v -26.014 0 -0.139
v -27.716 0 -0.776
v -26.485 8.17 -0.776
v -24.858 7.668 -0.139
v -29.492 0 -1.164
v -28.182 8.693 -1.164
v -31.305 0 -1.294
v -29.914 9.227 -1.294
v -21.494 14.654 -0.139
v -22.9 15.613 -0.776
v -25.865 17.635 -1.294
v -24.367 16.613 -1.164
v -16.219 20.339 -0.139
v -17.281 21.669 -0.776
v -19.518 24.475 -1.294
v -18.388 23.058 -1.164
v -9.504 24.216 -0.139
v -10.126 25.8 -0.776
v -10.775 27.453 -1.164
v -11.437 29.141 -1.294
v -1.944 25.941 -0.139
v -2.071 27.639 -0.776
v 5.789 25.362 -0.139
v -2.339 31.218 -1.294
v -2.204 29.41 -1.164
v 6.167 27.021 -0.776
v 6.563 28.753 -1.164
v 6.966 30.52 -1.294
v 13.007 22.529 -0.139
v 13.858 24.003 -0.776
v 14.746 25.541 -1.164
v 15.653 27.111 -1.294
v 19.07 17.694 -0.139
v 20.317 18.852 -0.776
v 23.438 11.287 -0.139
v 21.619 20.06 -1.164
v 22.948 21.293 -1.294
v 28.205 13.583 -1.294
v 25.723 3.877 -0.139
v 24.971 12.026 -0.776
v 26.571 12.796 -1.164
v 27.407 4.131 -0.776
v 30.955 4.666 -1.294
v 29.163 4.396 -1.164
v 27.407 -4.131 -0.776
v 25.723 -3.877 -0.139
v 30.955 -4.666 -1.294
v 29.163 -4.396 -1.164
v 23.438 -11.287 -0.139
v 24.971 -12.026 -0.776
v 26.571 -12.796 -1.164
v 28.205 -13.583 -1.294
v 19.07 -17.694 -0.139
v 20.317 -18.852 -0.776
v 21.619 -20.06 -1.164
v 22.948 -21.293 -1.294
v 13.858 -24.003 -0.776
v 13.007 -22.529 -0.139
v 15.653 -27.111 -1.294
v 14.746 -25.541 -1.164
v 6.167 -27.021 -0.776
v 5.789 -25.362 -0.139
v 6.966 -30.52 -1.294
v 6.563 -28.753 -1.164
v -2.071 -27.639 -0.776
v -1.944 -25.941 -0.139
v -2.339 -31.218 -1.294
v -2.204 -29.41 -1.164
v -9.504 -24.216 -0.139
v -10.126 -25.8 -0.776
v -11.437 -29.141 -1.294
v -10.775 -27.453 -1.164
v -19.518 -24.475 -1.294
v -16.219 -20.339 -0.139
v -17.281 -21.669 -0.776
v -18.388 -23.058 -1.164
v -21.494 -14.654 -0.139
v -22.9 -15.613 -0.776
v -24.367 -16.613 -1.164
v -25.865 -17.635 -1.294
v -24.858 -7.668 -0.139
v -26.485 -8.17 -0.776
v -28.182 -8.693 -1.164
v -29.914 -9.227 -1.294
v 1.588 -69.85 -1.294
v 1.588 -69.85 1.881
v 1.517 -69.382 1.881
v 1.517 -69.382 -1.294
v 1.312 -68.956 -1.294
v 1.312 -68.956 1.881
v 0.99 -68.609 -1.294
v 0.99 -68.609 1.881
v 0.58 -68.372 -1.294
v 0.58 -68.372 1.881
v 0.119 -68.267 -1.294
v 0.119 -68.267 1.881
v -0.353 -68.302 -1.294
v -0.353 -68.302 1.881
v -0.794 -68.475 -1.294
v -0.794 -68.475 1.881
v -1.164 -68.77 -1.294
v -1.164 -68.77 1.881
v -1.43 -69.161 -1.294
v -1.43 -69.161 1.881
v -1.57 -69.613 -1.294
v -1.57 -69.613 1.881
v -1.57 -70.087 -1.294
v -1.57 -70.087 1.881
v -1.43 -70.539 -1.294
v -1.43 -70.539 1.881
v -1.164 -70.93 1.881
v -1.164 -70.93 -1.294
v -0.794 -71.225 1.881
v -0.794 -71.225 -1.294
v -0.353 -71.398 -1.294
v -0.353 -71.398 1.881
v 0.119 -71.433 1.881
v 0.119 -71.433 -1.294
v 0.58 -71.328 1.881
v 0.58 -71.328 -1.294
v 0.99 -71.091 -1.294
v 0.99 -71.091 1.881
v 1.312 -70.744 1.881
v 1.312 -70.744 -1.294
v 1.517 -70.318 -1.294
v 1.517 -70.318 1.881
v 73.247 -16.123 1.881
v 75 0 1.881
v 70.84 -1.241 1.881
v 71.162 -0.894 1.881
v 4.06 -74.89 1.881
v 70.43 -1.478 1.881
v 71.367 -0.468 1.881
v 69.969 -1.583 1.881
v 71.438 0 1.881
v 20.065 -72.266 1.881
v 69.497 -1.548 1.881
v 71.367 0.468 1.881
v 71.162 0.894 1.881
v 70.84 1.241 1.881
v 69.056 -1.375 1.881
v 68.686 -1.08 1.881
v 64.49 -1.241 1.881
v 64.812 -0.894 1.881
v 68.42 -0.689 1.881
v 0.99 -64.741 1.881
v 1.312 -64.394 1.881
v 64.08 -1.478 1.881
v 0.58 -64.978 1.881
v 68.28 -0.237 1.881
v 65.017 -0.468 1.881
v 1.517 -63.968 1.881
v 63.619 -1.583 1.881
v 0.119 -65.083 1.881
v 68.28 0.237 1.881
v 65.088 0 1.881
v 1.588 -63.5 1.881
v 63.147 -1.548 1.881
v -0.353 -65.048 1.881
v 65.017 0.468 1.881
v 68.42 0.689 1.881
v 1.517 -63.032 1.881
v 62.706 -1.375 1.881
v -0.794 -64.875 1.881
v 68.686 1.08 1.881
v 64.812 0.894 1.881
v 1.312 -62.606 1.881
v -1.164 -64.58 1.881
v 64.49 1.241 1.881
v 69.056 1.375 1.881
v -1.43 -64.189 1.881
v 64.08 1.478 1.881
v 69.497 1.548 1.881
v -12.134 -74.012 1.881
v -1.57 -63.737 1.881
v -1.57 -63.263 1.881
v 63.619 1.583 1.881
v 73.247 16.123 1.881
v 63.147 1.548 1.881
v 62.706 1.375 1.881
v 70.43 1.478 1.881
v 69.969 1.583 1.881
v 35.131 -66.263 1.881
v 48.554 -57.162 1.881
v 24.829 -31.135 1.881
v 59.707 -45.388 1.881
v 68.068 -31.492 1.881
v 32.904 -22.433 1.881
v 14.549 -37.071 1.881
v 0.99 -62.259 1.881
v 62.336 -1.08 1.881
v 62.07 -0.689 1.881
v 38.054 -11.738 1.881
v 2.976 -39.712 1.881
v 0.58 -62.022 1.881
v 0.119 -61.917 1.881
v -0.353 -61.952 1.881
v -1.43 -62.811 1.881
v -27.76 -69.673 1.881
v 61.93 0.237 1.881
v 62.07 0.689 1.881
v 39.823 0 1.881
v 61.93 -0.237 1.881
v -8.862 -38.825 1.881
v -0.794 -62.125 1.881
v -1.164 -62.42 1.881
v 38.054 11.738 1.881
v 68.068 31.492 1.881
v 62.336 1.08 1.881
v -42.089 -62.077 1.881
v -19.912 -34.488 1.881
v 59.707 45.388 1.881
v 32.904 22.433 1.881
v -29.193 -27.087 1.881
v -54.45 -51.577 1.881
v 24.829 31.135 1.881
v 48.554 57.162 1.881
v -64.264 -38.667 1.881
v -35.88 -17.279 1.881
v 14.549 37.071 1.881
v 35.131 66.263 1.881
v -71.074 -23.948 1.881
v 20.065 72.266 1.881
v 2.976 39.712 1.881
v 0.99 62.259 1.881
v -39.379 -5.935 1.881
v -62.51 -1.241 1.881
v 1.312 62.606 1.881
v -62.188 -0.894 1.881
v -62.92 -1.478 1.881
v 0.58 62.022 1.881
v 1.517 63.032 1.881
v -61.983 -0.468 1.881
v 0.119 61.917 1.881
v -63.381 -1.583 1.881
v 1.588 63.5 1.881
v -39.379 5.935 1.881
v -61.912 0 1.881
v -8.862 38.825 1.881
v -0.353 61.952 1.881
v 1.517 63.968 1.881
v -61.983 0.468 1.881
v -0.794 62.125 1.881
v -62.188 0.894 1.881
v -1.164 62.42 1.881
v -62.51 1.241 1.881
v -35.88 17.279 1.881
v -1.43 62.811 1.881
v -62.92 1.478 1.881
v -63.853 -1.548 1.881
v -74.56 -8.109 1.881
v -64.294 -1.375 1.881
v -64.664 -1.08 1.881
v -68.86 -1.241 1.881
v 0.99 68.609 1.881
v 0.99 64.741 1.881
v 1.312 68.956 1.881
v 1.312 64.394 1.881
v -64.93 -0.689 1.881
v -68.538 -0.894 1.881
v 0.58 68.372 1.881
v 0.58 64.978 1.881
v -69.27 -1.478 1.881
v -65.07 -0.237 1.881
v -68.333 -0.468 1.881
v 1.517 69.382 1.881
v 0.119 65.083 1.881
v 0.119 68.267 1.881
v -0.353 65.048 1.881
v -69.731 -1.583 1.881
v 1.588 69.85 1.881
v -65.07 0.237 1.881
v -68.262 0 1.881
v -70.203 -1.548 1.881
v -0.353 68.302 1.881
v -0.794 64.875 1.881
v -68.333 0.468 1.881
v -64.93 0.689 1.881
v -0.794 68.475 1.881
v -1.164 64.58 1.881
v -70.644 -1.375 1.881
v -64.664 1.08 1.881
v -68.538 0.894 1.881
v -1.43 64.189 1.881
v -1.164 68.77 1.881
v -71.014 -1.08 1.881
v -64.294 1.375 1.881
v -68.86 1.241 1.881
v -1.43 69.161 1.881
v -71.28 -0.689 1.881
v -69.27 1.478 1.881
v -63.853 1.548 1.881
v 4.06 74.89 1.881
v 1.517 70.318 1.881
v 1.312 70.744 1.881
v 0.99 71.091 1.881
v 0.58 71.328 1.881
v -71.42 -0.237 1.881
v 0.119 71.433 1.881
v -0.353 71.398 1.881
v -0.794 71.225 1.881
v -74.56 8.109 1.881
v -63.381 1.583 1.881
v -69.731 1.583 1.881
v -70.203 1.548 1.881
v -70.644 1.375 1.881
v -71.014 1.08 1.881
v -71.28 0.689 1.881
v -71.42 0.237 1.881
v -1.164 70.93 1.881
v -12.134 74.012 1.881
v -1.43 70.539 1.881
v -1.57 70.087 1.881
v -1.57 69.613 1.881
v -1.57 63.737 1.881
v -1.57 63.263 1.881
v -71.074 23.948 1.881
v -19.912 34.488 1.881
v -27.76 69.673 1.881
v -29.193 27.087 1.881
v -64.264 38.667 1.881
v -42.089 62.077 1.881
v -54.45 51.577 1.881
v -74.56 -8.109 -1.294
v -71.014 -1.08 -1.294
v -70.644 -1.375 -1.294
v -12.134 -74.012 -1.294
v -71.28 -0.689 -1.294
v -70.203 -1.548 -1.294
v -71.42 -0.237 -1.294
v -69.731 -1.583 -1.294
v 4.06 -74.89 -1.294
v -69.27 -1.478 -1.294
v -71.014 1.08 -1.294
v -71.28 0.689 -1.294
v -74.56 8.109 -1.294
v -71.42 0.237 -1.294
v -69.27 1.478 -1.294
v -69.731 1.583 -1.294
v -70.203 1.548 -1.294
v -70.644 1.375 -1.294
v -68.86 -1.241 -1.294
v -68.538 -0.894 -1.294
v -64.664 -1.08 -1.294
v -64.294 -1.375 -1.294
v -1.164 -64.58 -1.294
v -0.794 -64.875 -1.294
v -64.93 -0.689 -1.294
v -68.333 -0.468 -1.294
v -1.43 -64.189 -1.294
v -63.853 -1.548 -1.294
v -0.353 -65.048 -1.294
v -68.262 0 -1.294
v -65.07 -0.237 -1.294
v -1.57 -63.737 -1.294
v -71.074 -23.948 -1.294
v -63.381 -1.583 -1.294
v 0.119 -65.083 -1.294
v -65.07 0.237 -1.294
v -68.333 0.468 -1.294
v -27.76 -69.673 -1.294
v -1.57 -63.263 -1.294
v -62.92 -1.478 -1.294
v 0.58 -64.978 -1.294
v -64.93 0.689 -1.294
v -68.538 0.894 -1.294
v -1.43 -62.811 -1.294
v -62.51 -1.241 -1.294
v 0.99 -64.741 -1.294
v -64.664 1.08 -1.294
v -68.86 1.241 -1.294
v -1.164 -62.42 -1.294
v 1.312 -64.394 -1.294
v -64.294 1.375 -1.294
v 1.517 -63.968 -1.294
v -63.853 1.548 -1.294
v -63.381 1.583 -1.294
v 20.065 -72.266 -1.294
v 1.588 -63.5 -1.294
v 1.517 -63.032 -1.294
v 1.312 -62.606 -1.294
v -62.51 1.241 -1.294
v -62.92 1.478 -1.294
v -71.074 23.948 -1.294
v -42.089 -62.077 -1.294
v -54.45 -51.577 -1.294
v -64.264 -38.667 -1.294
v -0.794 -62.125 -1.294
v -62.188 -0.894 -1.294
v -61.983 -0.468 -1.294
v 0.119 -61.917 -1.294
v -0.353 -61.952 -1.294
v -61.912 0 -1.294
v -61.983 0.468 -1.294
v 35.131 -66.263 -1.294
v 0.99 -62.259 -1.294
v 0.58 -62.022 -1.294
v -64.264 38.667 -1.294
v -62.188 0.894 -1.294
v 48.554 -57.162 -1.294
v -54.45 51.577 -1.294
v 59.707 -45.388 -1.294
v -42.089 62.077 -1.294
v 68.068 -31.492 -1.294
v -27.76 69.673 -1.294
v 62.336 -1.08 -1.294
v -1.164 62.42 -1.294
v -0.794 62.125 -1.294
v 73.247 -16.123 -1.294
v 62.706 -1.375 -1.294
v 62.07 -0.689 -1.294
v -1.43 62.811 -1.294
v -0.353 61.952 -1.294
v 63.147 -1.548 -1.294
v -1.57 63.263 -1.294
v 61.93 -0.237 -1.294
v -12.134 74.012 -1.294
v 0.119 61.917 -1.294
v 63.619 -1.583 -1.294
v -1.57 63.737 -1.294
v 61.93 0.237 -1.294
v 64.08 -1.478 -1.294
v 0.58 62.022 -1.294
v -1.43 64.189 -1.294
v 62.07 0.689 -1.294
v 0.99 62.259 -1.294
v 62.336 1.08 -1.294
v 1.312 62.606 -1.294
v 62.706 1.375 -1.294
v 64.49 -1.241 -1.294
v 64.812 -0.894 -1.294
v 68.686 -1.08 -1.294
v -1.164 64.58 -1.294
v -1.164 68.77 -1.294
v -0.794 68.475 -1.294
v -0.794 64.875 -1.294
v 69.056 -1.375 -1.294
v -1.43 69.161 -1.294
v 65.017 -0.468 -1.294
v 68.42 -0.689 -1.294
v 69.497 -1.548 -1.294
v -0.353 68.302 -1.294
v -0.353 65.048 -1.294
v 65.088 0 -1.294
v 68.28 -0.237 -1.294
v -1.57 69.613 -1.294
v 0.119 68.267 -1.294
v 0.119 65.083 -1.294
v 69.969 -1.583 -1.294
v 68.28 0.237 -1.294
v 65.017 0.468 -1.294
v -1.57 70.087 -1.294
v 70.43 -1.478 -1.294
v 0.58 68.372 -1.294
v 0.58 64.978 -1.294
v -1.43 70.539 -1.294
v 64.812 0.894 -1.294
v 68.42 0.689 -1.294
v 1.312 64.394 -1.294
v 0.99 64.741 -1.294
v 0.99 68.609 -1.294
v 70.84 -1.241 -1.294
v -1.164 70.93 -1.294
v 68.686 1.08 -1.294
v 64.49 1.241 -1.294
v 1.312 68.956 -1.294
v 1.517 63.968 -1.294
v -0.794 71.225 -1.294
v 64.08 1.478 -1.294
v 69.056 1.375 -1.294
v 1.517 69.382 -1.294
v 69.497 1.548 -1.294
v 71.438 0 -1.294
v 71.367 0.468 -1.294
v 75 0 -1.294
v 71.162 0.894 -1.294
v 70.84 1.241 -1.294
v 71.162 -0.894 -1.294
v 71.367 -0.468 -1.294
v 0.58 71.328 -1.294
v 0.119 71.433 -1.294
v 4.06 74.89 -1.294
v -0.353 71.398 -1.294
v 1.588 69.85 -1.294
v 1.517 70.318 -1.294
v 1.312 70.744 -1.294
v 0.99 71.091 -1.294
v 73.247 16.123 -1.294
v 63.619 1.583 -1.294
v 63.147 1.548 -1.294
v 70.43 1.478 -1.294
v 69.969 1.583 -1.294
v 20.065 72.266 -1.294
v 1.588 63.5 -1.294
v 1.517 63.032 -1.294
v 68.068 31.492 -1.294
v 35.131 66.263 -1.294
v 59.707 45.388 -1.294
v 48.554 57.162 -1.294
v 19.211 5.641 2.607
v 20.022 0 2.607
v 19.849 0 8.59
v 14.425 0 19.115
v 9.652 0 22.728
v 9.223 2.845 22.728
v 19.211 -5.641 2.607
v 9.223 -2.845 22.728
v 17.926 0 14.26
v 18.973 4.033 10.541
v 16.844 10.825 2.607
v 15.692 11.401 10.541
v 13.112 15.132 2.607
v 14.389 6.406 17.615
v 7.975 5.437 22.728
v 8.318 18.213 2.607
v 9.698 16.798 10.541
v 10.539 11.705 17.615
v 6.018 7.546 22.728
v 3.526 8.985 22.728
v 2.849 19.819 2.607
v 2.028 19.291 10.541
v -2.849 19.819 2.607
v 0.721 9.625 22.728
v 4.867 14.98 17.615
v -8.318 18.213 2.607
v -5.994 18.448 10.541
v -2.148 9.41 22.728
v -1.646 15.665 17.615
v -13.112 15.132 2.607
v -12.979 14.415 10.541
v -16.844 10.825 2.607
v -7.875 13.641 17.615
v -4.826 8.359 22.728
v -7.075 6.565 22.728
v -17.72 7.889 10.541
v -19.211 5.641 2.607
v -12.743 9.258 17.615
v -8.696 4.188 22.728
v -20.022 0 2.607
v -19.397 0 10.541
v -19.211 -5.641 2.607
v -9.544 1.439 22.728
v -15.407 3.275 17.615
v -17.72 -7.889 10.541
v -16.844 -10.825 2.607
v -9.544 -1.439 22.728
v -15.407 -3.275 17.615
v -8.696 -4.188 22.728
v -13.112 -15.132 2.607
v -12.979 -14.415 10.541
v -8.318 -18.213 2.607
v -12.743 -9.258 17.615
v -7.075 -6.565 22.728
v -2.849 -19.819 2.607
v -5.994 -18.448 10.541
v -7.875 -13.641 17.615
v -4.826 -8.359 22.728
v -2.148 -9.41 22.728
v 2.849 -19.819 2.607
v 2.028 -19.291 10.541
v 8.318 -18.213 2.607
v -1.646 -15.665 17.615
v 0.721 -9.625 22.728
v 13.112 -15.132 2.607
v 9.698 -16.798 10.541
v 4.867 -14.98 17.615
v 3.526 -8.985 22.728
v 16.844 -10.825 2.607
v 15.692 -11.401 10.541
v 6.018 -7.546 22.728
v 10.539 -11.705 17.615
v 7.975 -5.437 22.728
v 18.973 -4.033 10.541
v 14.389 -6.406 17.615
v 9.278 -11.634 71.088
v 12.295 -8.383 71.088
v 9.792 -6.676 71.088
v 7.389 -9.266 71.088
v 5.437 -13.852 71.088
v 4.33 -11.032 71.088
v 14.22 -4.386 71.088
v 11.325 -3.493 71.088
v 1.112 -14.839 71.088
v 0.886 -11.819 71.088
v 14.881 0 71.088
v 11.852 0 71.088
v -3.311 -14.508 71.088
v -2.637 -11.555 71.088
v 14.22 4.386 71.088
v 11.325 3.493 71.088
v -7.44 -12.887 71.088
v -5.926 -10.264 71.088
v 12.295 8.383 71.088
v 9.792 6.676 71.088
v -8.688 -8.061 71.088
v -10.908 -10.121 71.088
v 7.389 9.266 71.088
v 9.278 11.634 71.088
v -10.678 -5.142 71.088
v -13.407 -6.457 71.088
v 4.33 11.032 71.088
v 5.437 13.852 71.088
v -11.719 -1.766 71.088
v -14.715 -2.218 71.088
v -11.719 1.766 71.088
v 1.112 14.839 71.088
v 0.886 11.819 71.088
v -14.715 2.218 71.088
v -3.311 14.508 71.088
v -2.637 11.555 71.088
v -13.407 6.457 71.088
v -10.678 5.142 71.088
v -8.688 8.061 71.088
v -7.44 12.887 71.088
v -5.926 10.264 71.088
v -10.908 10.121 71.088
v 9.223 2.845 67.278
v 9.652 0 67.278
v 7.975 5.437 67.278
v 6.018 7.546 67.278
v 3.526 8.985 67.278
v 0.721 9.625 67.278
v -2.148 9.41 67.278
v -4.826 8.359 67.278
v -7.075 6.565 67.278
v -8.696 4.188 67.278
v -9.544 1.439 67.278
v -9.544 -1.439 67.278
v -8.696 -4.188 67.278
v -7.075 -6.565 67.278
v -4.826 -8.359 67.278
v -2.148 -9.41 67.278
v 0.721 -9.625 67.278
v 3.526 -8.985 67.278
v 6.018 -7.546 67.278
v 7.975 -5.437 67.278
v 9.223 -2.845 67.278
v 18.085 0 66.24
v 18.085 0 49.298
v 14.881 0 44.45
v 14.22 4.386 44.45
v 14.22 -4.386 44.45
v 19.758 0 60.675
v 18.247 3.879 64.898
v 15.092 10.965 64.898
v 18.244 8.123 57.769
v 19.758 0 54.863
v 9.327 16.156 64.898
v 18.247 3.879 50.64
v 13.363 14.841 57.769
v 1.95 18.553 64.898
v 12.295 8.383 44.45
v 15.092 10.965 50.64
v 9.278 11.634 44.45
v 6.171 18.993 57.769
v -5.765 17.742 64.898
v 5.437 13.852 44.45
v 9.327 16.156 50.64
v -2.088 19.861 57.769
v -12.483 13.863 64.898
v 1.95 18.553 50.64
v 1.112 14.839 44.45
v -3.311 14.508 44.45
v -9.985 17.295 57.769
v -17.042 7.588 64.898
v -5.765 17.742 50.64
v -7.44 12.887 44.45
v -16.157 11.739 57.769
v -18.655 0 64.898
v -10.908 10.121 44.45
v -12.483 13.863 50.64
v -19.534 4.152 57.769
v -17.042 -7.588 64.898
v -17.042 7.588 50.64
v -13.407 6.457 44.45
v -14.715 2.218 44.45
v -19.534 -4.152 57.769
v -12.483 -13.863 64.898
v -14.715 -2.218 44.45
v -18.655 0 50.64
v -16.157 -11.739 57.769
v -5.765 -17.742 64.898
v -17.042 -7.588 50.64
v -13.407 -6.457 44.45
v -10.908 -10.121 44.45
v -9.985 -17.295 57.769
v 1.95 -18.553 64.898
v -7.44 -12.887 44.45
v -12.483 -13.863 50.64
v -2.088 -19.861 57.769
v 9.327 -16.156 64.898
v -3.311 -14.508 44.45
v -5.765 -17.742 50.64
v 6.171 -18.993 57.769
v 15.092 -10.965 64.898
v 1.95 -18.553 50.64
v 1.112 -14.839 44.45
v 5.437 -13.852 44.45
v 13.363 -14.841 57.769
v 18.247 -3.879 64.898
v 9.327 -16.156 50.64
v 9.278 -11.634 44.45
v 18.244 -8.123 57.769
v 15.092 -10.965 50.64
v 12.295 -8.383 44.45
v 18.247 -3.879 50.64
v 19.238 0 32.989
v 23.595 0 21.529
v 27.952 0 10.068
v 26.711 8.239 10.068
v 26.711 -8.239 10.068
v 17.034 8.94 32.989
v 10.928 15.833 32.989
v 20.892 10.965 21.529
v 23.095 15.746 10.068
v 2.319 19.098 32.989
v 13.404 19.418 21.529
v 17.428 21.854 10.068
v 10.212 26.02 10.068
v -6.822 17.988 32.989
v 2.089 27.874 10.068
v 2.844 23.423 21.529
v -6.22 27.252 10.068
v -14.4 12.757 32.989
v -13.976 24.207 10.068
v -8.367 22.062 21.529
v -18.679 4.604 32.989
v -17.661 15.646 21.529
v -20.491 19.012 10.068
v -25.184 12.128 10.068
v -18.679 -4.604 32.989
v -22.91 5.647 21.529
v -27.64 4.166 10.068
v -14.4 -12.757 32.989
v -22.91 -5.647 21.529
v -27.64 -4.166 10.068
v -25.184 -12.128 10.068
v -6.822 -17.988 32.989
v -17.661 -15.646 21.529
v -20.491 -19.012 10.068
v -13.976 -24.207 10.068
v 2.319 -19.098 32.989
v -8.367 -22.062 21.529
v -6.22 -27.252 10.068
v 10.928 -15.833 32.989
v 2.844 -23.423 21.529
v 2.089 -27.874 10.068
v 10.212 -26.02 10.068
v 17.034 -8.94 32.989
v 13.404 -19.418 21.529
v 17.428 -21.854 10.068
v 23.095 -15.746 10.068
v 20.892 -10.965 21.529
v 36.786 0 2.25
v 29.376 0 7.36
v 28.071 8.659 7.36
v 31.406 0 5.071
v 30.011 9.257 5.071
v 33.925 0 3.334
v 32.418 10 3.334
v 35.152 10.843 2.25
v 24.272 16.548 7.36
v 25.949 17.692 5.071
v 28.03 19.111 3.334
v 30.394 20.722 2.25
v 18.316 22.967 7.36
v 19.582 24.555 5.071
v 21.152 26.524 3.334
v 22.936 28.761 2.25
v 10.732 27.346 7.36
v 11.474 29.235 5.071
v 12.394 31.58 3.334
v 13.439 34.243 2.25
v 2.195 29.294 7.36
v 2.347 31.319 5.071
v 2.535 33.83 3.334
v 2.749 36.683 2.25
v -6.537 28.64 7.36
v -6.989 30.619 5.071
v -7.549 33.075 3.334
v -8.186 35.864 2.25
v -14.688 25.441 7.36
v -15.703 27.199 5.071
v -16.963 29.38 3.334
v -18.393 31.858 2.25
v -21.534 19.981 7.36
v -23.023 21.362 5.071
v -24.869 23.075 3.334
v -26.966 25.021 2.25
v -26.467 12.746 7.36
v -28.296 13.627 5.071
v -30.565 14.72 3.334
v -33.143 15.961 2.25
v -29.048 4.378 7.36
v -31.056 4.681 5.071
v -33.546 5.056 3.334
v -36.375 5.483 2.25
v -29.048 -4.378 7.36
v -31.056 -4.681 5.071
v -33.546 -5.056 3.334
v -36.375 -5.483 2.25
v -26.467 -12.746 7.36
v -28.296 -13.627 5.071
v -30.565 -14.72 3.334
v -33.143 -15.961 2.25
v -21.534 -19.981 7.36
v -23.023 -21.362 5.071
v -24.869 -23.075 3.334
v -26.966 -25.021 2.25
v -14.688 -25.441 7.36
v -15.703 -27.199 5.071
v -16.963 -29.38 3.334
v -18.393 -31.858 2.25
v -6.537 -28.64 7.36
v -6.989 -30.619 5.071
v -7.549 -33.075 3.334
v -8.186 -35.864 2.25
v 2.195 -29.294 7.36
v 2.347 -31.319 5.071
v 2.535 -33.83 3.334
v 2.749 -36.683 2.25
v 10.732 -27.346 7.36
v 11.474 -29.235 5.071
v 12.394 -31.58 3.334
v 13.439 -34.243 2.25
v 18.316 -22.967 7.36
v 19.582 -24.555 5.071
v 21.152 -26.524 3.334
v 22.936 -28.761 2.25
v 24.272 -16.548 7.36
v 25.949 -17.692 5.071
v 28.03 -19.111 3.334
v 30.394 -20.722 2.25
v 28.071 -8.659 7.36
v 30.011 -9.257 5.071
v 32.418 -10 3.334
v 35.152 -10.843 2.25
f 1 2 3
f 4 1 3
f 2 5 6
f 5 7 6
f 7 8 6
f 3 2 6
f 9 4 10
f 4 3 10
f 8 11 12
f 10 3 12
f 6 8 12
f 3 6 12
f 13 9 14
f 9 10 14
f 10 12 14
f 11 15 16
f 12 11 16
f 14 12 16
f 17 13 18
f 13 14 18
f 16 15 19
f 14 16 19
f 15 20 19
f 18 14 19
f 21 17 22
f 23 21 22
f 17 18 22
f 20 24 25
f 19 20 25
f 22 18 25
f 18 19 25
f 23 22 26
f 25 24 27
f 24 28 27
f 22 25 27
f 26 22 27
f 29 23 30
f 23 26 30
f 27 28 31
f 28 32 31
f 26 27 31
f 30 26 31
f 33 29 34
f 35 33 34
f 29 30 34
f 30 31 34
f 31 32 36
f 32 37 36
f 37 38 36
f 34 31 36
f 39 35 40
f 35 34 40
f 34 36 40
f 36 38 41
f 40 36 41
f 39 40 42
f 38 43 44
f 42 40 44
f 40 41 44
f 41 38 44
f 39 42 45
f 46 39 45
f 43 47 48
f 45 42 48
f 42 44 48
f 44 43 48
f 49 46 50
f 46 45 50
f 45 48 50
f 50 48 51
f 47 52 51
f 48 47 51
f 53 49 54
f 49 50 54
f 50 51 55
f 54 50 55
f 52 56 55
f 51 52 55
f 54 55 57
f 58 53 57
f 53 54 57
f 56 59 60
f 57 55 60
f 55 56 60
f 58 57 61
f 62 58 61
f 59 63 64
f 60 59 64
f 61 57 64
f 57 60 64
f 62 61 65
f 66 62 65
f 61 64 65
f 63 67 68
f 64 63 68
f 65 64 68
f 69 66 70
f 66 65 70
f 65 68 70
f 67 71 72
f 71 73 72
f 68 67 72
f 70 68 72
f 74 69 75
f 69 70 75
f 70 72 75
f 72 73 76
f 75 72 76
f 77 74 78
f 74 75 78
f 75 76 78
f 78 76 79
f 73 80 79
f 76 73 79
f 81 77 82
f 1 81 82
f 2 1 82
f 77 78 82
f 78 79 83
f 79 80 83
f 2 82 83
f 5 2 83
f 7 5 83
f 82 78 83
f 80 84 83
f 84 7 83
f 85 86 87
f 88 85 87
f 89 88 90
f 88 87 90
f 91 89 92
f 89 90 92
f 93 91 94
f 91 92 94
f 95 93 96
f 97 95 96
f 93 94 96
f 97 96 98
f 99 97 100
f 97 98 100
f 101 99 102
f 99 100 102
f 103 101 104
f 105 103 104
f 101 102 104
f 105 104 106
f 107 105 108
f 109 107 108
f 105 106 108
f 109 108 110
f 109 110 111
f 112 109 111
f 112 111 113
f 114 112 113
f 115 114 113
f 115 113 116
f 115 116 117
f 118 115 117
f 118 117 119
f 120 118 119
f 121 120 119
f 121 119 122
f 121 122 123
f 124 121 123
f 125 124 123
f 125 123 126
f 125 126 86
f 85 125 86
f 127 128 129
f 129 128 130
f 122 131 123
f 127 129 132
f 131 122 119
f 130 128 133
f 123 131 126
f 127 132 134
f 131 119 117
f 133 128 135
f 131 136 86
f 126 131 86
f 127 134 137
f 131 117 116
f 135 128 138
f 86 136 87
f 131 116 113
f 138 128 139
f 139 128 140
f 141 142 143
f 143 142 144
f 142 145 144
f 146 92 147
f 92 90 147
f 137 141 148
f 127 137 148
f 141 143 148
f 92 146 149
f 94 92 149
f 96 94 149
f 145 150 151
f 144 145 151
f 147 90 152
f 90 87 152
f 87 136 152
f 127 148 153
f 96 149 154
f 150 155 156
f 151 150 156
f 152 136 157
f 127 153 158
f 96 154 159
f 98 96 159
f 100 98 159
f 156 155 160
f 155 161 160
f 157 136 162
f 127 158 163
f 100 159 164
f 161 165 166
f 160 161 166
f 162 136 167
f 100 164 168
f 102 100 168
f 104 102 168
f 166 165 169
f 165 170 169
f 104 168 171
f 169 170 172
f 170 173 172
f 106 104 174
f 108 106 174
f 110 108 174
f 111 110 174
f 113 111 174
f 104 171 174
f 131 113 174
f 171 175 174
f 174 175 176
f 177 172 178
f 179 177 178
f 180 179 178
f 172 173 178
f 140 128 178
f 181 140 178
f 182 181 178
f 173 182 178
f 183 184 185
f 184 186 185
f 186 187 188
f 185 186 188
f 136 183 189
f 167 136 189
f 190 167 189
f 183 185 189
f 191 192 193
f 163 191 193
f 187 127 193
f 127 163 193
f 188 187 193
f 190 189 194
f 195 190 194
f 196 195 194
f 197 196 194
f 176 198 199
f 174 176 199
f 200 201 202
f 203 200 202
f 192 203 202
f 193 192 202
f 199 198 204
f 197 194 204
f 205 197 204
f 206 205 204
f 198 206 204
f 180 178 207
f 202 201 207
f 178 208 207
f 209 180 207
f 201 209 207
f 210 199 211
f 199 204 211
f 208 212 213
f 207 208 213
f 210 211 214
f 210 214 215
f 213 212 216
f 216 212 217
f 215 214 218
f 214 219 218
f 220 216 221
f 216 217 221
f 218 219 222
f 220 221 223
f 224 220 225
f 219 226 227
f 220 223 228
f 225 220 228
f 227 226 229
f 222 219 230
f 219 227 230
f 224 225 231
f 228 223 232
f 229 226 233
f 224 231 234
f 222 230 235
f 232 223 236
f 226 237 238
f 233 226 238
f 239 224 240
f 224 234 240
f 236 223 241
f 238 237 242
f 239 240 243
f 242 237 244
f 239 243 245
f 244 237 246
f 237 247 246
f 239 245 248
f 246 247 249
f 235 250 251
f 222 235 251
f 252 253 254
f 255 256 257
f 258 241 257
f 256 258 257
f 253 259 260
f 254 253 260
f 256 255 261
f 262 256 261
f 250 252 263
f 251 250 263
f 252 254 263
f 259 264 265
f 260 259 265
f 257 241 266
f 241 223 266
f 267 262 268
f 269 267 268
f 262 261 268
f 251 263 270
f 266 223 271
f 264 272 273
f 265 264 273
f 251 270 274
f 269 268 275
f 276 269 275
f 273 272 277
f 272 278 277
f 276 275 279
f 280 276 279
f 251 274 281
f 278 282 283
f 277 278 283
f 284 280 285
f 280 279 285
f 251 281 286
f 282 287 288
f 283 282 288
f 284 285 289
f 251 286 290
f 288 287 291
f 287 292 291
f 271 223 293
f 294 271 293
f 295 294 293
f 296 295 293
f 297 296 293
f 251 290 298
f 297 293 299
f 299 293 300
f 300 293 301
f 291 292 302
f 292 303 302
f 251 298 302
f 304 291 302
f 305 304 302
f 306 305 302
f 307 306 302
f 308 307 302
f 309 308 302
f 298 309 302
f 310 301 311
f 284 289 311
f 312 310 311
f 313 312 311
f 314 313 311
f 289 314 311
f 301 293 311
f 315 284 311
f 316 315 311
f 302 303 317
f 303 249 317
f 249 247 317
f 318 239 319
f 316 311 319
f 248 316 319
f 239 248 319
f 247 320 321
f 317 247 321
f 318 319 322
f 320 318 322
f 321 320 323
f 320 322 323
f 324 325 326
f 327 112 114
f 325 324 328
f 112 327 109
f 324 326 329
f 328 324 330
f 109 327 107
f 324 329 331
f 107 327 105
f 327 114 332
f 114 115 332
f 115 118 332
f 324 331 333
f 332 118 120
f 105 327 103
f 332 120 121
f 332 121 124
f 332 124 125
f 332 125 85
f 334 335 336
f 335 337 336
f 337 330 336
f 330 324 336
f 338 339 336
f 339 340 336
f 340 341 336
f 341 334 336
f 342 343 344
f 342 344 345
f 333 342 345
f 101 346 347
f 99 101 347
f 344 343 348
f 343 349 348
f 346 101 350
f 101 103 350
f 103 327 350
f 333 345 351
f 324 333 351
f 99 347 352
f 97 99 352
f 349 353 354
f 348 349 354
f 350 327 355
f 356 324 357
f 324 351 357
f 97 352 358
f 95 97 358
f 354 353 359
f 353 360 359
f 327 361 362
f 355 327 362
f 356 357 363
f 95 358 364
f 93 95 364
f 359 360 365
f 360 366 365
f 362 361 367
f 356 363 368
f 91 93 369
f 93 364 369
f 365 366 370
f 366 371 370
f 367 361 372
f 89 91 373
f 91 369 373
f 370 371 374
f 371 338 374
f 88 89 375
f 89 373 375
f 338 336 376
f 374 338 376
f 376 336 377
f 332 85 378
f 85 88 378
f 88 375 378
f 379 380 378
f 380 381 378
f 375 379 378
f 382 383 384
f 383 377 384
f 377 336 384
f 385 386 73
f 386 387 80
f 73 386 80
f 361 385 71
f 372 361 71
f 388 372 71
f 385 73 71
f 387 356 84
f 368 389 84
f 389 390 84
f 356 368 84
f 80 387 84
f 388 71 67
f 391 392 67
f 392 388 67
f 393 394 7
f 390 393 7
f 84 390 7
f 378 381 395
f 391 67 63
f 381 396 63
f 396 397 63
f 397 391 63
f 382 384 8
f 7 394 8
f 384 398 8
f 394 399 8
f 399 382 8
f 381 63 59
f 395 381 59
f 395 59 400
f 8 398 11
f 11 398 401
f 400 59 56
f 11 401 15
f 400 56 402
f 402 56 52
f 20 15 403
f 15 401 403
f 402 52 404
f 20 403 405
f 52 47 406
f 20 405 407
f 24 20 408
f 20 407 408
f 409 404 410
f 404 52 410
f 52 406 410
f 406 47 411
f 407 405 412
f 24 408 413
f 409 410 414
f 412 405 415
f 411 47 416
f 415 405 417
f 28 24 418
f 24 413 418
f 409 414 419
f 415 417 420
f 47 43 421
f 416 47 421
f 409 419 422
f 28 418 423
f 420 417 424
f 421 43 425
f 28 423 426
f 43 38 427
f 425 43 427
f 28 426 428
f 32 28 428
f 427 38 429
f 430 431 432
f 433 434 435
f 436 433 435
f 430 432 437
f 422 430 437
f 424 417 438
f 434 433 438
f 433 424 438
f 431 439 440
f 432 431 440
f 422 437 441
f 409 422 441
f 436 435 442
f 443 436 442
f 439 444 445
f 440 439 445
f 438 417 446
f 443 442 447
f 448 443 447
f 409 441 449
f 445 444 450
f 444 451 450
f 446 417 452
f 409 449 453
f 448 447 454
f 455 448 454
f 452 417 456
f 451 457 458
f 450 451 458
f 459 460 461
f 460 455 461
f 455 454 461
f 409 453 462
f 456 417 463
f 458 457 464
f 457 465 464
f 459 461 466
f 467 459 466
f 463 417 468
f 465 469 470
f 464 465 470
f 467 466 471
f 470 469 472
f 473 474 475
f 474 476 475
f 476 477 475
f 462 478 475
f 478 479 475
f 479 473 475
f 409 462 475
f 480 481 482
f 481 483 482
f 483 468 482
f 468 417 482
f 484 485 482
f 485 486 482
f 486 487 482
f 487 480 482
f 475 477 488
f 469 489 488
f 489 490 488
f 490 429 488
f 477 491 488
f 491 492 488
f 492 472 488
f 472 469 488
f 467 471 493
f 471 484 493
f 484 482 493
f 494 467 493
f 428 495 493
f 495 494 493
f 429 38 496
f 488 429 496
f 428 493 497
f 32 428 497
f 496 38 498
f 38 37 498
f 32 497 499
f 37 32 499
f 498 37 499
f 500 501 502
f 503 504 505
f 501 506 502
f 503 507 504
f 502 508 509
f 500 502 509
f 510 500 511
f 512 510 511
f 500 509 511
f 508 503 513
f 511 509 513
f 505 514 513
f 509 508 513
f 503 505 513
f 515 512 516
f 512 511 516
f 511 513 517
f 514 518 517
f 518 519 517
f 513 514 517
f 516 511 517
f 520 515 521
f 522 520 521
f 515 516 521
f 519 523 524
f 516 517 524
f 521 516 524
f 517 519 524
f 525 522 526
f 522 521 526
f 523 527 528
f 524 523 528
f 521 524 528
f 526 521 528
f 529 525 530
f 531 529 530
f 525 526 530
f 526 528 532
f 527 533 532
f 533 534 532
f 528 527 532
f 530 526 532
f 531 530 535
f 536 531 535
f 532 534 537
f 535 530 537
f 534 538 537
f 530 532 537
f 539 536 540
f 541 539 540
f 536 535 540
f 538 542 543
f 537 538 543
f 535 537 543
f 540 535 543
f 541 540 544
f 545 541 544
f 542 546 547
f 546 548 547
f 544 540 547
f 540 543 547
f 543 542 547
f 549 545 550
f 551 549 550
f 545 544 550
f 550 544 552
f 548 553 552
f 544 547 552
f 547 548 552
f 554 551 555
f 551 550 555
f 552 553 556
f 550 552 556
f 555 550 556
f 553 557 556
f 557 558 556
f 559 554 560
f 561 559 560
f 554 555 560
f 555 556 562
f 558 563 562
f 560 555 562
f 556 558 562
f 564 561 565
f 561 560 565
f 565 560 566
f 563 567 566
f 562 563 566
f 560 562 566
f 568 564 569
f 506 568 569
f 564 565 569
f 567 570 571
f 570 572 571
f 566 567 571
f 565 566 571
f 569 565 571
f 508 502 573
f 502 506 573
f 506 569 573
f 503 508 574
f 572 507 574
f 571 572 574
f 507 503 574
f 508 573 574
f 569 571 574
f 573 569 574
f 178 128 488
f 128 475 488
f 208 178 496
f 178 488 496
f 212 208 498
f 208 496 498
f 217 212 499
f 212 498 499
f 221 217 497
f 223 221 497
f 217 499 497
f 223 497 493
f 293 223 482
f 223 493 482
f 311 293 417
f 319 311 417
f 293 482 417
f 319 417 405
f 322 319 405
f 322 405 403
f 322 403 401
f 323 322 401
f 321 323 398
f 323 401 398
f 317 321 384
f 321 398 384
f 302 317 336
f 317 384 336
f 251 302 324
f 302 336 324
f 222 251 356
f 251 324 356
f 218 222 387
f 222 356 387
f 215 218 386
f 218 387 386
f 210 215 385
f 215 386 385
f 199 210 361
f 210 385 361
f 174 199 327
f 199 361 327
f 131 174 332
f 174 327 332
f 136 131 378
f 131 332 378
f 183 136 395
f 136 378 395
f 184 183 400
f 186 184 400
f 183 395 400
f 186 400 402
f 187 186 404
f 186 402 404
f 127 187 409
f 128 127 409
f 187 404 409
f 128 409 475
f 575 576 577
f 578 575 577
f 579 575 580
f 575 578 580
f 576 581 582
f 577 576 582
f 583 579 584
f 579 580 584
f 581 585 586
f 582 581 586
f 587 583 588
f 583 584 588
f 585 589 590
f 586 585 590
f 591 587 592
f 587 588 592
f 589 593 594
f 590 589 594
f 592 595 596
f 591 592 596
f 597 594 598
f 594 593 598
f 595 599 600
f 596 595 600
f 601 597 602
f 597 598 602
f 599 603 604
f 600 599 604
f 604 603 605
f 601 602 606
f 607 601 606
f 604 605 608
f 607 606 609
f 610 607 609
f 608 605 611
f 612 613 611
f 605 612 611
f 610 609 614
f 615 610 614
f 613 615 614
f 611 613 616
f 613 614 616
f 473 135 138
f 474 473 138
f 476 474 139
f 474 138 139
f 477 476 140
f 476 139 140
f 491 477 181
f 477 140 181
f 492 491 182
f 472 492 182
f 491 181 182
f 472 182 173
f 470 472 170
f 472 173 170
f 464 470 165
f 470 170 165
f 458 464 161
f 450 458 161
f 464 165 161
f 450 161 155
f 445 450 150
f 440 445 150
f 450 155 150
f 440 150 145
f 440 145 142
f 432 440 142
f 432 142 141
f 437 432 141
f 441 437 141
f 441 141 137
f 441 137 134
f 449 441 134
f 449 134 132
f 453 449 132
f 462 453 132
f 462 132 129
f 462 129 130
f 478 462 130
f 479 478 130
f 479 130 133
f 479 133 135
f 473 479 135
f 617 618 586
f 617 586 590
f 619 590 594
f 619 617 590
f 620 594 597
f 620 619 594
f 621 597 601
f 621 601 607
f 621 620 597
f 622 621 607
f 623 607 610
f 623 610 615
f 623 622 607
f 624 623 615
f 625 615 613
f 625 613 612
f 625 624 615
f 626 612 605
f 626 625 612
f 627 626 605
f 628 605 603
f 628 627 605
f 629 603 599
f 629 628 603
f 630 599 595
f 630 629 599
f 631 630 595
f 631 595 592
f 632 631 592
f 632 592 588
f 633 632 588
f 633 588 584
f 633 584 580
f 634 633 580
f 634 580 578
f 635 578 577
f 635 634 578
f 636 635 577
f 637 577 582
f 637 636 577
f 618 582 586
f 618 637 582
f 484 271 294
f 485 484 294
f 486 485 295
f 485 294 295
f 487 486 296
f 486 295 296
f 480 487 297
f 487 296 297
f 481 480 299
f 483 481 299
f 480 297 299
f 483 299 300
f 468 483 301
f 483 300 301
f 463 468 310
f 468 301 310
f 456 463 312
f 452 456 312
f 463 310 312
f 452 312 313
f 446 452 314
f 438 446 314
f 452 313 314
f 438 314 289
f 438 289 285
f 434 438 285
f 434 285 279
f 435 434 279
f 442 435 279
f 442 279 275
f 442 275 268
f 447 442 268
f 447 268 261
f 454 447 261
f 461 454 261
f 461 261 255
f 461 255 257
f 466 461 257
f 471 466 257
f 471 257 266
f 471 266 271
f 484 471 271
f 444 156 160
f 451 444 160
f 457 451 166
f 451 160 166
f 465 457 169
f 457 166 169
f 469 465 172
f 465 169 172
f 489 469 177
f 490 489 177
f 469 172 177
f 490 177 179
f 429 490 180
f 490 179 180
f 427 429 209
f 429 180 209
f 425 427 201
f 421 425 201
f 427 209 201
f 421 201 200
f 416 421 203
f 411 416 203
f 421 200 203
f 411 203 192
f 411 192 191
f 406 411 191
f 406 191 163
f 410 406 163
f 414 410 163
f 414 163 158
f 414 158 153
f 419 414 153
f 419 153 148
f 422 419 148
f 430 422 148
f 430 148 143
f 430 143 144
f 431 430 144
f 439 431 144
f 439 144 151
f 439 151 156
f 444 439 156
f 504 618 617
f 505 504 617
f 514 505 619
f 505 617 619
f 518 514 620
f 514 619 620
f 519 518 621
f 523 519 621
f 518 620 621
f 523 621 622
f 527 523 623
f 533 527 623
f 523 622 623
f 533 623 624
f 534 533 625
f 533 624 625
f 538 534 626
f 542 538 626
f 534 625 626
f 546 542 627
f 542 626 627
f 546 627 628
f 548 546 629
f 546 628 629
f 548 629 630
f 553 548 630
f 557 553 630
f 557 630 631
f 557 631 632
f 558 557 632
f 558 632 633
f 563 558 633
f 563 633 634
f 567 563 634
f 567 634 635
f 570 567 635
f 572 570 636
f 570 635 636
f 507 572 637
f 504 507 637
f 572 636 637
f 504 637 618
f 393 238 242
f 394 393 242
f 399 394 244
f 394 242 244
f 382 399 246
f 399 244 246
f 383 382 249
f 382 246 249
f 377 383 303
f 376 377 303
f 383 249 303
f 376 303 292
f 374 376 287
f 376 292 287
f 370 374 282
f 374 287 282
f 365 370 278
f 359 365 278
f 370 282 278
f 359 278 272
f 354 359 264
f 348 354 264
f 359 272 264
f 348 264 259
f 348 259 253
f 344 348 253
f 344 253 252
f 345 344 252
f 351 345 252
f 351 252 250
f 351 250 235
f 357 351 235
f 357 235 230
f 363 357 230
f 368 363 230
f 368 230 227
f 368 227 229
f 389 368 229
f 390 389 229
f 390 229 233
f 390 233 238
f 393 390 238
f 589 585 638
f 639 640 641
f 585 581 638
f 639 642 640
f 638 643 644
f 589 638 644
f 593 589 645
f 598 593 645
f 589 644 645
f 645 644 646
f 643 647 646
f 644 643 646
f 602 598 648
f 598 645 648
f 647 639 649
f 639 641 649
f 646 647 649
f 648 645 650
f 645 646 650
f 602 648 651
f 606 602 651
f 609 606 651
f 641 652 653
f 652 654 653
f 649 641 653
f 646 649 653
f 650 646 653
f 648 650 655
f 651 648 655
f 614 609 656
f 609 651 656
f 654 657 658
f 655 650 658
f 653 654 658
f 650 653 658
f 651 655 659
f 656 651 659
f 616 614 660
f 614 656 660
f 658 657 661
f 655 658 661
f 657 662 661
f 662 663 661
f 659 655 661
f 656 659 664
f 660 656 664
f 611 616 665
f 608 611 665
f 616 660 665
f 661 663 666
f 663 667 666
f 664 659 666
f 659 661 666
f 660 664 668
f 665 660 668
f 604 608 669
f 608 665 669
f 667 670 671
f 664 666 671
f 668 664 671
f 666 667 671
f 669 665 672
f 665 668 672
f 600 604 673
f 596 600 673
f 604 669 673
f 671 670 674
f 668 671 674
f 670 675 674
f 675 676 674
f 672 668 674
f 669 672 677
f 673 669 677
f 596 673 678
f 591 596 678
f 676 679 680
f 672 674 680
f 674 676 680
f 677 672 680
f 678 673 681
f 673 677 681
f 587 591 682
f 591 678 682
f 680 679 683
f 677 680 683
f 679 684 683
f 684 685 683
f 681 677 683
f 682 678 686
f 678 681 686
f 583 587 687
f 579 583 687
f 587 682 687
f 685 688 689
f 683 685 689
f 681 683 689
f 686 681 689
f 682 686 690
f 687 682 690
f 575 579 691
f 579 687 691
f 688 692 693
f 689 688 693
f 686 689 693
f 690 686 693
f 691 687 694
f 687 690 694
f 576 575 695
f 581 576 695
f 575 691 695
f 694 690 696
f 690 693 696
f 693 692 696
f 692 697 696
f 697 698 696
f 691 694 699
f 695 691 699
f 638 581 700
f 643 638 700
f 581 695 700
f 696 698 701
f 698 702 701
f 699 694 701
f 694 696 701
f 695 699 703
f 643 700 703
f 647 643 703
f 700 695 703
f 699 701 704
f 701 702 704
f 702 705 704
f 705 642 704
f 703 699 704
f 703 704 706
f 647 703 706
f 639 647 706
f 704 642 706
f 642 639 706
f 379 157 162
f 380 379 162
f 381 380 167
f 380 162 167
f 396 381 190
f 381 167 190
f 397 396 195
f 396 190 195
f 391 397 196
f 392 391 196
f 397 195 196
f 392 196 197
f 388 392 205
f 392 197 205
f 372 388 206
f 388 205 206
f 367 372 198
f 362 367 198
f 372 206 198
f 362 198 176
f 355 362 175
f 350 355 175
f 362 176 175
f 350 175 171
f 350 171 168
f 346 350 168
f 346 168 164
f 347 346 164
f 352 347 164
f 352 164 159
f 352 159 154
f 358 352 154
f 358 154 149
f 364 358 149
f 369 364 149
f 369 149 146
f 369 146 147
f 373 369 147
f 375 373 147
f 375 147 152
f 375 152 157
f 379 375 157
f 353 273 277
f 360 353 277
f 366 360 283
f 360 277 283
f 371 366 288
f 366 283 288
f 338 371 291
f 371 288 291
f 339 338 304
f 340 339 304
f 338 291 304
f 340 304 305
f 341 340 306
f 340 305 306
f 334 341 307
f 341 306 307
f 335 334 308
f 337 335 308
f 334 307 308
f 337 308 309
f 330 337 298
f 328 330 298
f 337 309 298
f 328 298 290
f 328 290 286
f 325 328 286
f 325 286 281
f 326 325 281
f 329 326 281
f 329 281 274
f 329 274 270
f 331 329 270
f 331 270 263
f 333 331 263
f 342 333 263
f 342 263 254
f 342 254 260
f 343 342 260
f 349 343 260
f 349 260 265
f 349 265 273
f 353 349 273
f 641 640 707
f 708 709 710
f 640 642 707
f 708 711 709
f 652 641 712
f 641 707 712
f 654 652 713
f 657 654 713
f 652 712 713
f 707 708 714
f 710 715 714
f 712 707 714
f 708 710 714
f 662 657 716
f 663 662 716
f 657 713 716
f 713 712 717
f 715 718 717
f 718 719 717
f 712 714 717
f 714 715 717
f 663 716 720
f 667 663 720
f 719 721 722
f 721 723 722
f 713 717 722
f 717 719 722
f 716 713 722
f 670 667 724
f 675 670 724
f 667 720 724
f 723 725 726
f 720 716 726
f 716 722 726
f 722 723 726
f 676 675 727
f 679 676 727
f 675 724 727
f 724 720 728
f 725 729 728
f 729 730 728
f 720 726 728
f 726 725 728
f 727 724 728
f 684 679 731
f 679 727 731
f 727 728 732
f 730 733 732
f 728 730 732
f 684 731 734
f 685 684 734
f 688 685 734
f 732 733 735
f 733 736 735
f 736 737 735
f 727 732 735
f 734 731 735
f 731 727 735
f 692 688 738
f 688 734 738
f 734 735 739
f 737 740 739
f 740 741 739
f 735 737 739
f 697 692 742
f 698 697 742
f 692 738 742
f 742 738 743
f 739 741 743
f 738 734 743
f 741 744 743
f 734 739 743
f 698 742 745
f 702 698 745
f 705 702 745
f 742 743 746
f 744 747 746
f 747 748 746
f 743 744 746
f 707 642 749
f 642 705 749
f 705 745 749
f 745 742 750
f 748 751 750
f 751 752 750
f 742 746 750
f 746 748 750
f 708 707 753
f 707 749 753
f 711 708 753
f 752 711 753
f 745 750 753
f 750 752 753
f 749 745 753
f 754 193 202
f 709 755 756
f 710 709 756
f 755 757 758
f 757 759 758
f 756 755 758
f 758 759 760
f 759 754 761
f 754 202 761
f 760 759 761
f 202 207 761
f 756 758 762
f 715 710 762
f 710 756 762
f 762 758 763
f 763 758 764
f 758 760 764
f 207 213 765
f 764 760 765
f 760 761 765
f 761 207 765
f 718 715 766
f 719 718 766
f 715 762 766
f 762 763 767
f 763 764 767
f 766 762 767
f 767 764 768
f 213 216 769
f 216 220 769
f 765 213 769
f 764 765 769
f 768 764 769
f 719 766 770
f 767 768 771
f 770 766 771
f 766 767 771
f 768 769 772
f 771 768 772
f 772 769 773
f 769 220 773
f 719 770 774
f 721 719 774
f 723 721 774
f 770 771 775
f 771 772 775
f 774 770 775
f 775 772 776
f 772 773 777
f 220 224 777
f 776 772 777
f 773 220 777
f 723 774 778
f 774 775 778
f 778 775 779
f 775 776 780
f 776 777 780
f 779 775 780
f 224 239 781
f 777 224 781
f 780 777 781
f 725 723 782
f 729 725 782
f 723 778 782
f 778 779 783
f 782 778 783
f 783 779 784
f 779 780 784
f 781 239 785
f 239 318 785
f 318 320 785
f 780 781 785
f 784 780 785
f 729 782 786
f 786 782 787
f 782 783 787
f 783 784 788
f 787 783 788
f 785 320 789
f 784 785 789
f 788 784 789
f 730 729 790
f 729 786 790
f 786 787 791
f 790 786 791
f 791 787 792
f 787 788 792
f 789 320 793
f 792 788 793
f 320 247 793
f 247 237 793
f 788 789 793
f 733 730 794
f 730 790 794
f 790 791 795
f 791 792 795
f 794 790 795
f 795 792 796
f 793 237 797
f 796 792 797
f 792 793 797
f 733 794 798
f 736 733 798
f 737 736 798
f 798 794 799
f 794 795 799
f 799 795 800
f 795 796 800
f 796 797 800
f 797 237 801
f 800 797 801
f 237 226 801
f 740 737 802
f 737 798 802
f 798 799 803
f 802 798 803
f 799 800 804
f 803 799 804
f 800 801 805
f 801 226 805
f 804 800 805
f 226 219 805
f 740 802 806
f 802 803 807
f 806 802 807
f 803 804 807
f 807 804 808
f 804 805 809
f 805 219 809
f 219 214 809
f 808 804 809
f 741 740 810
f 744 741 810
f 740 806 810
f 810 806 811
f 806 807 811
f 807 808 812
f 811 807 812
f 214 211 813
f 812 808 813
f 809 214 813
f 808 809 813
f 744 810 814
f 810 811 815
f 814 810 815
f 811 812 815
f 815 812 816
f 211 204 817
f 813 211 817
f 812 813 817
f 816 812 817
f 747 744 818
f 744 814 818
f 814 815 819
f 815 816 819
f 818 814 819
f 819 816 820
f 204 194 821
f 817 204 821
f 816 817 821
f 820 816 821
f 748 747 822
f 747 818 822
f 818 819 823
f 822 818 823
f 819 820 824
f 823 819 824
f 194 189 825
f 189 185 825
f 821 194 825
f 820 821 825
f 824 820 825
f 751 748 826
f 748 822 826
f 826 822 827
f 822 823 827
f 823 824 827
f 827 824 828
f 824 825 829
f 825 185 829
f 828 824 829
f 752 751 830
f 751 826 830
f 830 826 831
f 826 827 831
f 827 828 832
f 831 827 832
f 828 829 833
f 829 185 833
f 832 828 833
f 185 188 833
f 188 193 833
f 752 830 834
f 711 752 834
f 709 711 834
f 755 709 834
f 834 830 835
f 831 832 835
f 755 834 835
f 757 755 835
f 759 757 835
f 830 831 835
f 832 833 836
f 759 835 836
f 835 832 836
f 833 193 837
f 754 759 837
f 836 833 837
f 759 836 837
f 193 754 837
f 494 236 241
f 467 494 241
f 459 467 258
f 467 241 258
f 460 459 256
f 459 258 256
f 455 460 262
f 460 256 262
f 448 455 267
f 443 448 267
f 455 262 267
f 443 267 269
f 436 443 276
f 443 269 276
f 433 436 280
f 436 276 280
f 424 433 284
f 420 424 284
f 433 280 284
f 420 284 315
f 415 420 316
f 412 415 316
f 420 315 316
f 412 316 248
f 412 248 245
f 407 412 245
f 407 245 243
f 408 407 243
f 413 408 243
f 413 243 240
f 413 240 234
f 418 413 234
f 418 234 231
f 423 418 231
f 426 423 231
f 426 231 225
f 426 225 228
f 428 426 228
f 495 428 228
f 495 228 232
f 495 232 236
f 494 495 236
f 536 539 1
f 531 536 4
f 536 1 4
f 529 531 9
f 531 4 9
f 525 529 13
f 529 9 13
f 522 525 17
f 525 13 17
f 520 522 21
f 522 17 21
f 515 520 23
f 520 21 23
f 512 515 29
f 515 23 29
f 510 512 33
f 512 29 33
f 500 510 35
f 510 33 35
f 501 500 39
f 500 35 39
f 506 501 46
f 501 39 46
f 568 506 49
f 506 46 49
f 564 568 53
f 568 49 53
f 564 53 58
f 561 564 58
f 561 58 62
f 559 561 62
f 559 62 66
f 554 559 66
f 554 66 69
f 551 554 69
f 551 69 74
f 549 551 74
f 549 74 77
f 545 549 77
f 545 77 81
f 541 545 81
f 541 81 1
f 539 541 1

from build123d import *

# Parameters (mm, degrees)
SKETCH2_R          = 28.533493352
CUT_EXTRUDE1_DEPTH = 3.900597164
CUT_EXTRUDE1_DRAFT = -65.378461827
HOLE1_D            = 3.175
HOLE1_DEPTH        = 72.381695866
CHAMFER1_SIZE      = 2.199704526
CHAMFER1_SIZE2     = 3.81
FILLET1_R          = 12.7


with BuildPart() as part:
    # Sketch1 → Revolve1 (revolve)
    with BuildSketch(Plane(origin=(0, 0, 0), x_dir=(1, 0, 0), z_dir=(0, 1, 0))):
        with BuildLine():
            Line((75, 1.293744634), (0, 1.293744634))
            Line((0, 1.293744634), (0, -2.606852529))
            Line((0, -2.606852529), (20.022304736, -2.606852529))
            ThreePointArc((20.022304736, -2.606852529), (17.926393777, -14.259573819), (9.652, -22.727936343))
            Line((9.652, -22.727936343), (9.652, -71.087951232))
            Line((9.652, -71.087951232), (14.88071719, -71.087951232))
            ThreePointArc((14.88071719, -71.087951232), (19.97075, -57.768975616), (14.88071719, -44.45))
            Line((14.88071719, -44.45), (31.064900574, -1.881255366))
            Line((31.064900574, -1.881255366), (75, -1.881255366))
            Line((75, -1.881255366), (75, 1.293744634))
        make_face()
    revolve(axis=Axis((0, 0, -1.293744634), (0, 0, 1)))


with BuildPart() as cut_extrude1_tool:
    # Sketch2 → Cut-Extrude1 (with draft: the straight prism first)
    with BuildSketch(Plane(origin=(0, 0, -1.293744634), x_dir=(-1, 0, 0), z_dir=(0, 0, -1))):
        Circle(SKETCH2_R)
    extrude(amount=-CUT_EXTRUDE1_DEPTH)
    # Cut-Extrude1: the draft: its side faces are tilted about the plane it starts from
    cut_extrude1_sides = [cut_extrude1_tool.faces().sort_by_distance(p)[0] for p in [
        (28.533493352, 0, 0.656553947),
    ]]
    draft(cut_extrude1_sides, Plane(origin=(0, 0, -1.293744634), x_dir=(-1, 0, 0), z_dir=(0, 0, -1)), CUT_EXTRUDE1_DRAFT)


with BuildPart() as part_1:
    add(part.part)

    # Cut-Extrude1: cut by cut_extrude1_tool
    add(cut_extrude1_tool.part, mode=Mode.SUBTRACT)

    # Hole1
    with Locations(Plane(origin=(0, 0, -1.293744634), x_dir=(-1, 0, 0), z_dir=(0, 0, -1))):
        with Locations((-63.5, 0), (-69.85, 0), (0, 63.5), (0, 69.85), (63.5, 0), (69.85, 0), (0, -63.5), (0, -69.85)):
            Hole(HOLE1_D / 2, depth=HOLE1_DEPTH)

    # Chamfer1
    chamfer1_edges = [part_1.edges().sort_by_distance(p)[0] for p in [
        (-9.652, 0, 71.087951232),
    ]]
    chamfer1_side = [part_1.faces().sort_by_distance(p)[0] for p in [
        (-10.072890241, 0, 71.087951232),
    ]]
    chamfer(chamfer1_edges, length=CHAMFER1_SIZE, length2=CHAMFER1_SIZE2, reference=chamfer1_side[0])

    # Fillet1
    fillet1_edges = [part_1.edges().sort_by_distance(p)[0] for p in [
        (-31.064900574, 0, 1.881255366),
        (28.533493352, 0, -1.293744634),
    ]]
    fillet(fillet1_edges, radius=FILLET1_R)


solid = part_1.part
